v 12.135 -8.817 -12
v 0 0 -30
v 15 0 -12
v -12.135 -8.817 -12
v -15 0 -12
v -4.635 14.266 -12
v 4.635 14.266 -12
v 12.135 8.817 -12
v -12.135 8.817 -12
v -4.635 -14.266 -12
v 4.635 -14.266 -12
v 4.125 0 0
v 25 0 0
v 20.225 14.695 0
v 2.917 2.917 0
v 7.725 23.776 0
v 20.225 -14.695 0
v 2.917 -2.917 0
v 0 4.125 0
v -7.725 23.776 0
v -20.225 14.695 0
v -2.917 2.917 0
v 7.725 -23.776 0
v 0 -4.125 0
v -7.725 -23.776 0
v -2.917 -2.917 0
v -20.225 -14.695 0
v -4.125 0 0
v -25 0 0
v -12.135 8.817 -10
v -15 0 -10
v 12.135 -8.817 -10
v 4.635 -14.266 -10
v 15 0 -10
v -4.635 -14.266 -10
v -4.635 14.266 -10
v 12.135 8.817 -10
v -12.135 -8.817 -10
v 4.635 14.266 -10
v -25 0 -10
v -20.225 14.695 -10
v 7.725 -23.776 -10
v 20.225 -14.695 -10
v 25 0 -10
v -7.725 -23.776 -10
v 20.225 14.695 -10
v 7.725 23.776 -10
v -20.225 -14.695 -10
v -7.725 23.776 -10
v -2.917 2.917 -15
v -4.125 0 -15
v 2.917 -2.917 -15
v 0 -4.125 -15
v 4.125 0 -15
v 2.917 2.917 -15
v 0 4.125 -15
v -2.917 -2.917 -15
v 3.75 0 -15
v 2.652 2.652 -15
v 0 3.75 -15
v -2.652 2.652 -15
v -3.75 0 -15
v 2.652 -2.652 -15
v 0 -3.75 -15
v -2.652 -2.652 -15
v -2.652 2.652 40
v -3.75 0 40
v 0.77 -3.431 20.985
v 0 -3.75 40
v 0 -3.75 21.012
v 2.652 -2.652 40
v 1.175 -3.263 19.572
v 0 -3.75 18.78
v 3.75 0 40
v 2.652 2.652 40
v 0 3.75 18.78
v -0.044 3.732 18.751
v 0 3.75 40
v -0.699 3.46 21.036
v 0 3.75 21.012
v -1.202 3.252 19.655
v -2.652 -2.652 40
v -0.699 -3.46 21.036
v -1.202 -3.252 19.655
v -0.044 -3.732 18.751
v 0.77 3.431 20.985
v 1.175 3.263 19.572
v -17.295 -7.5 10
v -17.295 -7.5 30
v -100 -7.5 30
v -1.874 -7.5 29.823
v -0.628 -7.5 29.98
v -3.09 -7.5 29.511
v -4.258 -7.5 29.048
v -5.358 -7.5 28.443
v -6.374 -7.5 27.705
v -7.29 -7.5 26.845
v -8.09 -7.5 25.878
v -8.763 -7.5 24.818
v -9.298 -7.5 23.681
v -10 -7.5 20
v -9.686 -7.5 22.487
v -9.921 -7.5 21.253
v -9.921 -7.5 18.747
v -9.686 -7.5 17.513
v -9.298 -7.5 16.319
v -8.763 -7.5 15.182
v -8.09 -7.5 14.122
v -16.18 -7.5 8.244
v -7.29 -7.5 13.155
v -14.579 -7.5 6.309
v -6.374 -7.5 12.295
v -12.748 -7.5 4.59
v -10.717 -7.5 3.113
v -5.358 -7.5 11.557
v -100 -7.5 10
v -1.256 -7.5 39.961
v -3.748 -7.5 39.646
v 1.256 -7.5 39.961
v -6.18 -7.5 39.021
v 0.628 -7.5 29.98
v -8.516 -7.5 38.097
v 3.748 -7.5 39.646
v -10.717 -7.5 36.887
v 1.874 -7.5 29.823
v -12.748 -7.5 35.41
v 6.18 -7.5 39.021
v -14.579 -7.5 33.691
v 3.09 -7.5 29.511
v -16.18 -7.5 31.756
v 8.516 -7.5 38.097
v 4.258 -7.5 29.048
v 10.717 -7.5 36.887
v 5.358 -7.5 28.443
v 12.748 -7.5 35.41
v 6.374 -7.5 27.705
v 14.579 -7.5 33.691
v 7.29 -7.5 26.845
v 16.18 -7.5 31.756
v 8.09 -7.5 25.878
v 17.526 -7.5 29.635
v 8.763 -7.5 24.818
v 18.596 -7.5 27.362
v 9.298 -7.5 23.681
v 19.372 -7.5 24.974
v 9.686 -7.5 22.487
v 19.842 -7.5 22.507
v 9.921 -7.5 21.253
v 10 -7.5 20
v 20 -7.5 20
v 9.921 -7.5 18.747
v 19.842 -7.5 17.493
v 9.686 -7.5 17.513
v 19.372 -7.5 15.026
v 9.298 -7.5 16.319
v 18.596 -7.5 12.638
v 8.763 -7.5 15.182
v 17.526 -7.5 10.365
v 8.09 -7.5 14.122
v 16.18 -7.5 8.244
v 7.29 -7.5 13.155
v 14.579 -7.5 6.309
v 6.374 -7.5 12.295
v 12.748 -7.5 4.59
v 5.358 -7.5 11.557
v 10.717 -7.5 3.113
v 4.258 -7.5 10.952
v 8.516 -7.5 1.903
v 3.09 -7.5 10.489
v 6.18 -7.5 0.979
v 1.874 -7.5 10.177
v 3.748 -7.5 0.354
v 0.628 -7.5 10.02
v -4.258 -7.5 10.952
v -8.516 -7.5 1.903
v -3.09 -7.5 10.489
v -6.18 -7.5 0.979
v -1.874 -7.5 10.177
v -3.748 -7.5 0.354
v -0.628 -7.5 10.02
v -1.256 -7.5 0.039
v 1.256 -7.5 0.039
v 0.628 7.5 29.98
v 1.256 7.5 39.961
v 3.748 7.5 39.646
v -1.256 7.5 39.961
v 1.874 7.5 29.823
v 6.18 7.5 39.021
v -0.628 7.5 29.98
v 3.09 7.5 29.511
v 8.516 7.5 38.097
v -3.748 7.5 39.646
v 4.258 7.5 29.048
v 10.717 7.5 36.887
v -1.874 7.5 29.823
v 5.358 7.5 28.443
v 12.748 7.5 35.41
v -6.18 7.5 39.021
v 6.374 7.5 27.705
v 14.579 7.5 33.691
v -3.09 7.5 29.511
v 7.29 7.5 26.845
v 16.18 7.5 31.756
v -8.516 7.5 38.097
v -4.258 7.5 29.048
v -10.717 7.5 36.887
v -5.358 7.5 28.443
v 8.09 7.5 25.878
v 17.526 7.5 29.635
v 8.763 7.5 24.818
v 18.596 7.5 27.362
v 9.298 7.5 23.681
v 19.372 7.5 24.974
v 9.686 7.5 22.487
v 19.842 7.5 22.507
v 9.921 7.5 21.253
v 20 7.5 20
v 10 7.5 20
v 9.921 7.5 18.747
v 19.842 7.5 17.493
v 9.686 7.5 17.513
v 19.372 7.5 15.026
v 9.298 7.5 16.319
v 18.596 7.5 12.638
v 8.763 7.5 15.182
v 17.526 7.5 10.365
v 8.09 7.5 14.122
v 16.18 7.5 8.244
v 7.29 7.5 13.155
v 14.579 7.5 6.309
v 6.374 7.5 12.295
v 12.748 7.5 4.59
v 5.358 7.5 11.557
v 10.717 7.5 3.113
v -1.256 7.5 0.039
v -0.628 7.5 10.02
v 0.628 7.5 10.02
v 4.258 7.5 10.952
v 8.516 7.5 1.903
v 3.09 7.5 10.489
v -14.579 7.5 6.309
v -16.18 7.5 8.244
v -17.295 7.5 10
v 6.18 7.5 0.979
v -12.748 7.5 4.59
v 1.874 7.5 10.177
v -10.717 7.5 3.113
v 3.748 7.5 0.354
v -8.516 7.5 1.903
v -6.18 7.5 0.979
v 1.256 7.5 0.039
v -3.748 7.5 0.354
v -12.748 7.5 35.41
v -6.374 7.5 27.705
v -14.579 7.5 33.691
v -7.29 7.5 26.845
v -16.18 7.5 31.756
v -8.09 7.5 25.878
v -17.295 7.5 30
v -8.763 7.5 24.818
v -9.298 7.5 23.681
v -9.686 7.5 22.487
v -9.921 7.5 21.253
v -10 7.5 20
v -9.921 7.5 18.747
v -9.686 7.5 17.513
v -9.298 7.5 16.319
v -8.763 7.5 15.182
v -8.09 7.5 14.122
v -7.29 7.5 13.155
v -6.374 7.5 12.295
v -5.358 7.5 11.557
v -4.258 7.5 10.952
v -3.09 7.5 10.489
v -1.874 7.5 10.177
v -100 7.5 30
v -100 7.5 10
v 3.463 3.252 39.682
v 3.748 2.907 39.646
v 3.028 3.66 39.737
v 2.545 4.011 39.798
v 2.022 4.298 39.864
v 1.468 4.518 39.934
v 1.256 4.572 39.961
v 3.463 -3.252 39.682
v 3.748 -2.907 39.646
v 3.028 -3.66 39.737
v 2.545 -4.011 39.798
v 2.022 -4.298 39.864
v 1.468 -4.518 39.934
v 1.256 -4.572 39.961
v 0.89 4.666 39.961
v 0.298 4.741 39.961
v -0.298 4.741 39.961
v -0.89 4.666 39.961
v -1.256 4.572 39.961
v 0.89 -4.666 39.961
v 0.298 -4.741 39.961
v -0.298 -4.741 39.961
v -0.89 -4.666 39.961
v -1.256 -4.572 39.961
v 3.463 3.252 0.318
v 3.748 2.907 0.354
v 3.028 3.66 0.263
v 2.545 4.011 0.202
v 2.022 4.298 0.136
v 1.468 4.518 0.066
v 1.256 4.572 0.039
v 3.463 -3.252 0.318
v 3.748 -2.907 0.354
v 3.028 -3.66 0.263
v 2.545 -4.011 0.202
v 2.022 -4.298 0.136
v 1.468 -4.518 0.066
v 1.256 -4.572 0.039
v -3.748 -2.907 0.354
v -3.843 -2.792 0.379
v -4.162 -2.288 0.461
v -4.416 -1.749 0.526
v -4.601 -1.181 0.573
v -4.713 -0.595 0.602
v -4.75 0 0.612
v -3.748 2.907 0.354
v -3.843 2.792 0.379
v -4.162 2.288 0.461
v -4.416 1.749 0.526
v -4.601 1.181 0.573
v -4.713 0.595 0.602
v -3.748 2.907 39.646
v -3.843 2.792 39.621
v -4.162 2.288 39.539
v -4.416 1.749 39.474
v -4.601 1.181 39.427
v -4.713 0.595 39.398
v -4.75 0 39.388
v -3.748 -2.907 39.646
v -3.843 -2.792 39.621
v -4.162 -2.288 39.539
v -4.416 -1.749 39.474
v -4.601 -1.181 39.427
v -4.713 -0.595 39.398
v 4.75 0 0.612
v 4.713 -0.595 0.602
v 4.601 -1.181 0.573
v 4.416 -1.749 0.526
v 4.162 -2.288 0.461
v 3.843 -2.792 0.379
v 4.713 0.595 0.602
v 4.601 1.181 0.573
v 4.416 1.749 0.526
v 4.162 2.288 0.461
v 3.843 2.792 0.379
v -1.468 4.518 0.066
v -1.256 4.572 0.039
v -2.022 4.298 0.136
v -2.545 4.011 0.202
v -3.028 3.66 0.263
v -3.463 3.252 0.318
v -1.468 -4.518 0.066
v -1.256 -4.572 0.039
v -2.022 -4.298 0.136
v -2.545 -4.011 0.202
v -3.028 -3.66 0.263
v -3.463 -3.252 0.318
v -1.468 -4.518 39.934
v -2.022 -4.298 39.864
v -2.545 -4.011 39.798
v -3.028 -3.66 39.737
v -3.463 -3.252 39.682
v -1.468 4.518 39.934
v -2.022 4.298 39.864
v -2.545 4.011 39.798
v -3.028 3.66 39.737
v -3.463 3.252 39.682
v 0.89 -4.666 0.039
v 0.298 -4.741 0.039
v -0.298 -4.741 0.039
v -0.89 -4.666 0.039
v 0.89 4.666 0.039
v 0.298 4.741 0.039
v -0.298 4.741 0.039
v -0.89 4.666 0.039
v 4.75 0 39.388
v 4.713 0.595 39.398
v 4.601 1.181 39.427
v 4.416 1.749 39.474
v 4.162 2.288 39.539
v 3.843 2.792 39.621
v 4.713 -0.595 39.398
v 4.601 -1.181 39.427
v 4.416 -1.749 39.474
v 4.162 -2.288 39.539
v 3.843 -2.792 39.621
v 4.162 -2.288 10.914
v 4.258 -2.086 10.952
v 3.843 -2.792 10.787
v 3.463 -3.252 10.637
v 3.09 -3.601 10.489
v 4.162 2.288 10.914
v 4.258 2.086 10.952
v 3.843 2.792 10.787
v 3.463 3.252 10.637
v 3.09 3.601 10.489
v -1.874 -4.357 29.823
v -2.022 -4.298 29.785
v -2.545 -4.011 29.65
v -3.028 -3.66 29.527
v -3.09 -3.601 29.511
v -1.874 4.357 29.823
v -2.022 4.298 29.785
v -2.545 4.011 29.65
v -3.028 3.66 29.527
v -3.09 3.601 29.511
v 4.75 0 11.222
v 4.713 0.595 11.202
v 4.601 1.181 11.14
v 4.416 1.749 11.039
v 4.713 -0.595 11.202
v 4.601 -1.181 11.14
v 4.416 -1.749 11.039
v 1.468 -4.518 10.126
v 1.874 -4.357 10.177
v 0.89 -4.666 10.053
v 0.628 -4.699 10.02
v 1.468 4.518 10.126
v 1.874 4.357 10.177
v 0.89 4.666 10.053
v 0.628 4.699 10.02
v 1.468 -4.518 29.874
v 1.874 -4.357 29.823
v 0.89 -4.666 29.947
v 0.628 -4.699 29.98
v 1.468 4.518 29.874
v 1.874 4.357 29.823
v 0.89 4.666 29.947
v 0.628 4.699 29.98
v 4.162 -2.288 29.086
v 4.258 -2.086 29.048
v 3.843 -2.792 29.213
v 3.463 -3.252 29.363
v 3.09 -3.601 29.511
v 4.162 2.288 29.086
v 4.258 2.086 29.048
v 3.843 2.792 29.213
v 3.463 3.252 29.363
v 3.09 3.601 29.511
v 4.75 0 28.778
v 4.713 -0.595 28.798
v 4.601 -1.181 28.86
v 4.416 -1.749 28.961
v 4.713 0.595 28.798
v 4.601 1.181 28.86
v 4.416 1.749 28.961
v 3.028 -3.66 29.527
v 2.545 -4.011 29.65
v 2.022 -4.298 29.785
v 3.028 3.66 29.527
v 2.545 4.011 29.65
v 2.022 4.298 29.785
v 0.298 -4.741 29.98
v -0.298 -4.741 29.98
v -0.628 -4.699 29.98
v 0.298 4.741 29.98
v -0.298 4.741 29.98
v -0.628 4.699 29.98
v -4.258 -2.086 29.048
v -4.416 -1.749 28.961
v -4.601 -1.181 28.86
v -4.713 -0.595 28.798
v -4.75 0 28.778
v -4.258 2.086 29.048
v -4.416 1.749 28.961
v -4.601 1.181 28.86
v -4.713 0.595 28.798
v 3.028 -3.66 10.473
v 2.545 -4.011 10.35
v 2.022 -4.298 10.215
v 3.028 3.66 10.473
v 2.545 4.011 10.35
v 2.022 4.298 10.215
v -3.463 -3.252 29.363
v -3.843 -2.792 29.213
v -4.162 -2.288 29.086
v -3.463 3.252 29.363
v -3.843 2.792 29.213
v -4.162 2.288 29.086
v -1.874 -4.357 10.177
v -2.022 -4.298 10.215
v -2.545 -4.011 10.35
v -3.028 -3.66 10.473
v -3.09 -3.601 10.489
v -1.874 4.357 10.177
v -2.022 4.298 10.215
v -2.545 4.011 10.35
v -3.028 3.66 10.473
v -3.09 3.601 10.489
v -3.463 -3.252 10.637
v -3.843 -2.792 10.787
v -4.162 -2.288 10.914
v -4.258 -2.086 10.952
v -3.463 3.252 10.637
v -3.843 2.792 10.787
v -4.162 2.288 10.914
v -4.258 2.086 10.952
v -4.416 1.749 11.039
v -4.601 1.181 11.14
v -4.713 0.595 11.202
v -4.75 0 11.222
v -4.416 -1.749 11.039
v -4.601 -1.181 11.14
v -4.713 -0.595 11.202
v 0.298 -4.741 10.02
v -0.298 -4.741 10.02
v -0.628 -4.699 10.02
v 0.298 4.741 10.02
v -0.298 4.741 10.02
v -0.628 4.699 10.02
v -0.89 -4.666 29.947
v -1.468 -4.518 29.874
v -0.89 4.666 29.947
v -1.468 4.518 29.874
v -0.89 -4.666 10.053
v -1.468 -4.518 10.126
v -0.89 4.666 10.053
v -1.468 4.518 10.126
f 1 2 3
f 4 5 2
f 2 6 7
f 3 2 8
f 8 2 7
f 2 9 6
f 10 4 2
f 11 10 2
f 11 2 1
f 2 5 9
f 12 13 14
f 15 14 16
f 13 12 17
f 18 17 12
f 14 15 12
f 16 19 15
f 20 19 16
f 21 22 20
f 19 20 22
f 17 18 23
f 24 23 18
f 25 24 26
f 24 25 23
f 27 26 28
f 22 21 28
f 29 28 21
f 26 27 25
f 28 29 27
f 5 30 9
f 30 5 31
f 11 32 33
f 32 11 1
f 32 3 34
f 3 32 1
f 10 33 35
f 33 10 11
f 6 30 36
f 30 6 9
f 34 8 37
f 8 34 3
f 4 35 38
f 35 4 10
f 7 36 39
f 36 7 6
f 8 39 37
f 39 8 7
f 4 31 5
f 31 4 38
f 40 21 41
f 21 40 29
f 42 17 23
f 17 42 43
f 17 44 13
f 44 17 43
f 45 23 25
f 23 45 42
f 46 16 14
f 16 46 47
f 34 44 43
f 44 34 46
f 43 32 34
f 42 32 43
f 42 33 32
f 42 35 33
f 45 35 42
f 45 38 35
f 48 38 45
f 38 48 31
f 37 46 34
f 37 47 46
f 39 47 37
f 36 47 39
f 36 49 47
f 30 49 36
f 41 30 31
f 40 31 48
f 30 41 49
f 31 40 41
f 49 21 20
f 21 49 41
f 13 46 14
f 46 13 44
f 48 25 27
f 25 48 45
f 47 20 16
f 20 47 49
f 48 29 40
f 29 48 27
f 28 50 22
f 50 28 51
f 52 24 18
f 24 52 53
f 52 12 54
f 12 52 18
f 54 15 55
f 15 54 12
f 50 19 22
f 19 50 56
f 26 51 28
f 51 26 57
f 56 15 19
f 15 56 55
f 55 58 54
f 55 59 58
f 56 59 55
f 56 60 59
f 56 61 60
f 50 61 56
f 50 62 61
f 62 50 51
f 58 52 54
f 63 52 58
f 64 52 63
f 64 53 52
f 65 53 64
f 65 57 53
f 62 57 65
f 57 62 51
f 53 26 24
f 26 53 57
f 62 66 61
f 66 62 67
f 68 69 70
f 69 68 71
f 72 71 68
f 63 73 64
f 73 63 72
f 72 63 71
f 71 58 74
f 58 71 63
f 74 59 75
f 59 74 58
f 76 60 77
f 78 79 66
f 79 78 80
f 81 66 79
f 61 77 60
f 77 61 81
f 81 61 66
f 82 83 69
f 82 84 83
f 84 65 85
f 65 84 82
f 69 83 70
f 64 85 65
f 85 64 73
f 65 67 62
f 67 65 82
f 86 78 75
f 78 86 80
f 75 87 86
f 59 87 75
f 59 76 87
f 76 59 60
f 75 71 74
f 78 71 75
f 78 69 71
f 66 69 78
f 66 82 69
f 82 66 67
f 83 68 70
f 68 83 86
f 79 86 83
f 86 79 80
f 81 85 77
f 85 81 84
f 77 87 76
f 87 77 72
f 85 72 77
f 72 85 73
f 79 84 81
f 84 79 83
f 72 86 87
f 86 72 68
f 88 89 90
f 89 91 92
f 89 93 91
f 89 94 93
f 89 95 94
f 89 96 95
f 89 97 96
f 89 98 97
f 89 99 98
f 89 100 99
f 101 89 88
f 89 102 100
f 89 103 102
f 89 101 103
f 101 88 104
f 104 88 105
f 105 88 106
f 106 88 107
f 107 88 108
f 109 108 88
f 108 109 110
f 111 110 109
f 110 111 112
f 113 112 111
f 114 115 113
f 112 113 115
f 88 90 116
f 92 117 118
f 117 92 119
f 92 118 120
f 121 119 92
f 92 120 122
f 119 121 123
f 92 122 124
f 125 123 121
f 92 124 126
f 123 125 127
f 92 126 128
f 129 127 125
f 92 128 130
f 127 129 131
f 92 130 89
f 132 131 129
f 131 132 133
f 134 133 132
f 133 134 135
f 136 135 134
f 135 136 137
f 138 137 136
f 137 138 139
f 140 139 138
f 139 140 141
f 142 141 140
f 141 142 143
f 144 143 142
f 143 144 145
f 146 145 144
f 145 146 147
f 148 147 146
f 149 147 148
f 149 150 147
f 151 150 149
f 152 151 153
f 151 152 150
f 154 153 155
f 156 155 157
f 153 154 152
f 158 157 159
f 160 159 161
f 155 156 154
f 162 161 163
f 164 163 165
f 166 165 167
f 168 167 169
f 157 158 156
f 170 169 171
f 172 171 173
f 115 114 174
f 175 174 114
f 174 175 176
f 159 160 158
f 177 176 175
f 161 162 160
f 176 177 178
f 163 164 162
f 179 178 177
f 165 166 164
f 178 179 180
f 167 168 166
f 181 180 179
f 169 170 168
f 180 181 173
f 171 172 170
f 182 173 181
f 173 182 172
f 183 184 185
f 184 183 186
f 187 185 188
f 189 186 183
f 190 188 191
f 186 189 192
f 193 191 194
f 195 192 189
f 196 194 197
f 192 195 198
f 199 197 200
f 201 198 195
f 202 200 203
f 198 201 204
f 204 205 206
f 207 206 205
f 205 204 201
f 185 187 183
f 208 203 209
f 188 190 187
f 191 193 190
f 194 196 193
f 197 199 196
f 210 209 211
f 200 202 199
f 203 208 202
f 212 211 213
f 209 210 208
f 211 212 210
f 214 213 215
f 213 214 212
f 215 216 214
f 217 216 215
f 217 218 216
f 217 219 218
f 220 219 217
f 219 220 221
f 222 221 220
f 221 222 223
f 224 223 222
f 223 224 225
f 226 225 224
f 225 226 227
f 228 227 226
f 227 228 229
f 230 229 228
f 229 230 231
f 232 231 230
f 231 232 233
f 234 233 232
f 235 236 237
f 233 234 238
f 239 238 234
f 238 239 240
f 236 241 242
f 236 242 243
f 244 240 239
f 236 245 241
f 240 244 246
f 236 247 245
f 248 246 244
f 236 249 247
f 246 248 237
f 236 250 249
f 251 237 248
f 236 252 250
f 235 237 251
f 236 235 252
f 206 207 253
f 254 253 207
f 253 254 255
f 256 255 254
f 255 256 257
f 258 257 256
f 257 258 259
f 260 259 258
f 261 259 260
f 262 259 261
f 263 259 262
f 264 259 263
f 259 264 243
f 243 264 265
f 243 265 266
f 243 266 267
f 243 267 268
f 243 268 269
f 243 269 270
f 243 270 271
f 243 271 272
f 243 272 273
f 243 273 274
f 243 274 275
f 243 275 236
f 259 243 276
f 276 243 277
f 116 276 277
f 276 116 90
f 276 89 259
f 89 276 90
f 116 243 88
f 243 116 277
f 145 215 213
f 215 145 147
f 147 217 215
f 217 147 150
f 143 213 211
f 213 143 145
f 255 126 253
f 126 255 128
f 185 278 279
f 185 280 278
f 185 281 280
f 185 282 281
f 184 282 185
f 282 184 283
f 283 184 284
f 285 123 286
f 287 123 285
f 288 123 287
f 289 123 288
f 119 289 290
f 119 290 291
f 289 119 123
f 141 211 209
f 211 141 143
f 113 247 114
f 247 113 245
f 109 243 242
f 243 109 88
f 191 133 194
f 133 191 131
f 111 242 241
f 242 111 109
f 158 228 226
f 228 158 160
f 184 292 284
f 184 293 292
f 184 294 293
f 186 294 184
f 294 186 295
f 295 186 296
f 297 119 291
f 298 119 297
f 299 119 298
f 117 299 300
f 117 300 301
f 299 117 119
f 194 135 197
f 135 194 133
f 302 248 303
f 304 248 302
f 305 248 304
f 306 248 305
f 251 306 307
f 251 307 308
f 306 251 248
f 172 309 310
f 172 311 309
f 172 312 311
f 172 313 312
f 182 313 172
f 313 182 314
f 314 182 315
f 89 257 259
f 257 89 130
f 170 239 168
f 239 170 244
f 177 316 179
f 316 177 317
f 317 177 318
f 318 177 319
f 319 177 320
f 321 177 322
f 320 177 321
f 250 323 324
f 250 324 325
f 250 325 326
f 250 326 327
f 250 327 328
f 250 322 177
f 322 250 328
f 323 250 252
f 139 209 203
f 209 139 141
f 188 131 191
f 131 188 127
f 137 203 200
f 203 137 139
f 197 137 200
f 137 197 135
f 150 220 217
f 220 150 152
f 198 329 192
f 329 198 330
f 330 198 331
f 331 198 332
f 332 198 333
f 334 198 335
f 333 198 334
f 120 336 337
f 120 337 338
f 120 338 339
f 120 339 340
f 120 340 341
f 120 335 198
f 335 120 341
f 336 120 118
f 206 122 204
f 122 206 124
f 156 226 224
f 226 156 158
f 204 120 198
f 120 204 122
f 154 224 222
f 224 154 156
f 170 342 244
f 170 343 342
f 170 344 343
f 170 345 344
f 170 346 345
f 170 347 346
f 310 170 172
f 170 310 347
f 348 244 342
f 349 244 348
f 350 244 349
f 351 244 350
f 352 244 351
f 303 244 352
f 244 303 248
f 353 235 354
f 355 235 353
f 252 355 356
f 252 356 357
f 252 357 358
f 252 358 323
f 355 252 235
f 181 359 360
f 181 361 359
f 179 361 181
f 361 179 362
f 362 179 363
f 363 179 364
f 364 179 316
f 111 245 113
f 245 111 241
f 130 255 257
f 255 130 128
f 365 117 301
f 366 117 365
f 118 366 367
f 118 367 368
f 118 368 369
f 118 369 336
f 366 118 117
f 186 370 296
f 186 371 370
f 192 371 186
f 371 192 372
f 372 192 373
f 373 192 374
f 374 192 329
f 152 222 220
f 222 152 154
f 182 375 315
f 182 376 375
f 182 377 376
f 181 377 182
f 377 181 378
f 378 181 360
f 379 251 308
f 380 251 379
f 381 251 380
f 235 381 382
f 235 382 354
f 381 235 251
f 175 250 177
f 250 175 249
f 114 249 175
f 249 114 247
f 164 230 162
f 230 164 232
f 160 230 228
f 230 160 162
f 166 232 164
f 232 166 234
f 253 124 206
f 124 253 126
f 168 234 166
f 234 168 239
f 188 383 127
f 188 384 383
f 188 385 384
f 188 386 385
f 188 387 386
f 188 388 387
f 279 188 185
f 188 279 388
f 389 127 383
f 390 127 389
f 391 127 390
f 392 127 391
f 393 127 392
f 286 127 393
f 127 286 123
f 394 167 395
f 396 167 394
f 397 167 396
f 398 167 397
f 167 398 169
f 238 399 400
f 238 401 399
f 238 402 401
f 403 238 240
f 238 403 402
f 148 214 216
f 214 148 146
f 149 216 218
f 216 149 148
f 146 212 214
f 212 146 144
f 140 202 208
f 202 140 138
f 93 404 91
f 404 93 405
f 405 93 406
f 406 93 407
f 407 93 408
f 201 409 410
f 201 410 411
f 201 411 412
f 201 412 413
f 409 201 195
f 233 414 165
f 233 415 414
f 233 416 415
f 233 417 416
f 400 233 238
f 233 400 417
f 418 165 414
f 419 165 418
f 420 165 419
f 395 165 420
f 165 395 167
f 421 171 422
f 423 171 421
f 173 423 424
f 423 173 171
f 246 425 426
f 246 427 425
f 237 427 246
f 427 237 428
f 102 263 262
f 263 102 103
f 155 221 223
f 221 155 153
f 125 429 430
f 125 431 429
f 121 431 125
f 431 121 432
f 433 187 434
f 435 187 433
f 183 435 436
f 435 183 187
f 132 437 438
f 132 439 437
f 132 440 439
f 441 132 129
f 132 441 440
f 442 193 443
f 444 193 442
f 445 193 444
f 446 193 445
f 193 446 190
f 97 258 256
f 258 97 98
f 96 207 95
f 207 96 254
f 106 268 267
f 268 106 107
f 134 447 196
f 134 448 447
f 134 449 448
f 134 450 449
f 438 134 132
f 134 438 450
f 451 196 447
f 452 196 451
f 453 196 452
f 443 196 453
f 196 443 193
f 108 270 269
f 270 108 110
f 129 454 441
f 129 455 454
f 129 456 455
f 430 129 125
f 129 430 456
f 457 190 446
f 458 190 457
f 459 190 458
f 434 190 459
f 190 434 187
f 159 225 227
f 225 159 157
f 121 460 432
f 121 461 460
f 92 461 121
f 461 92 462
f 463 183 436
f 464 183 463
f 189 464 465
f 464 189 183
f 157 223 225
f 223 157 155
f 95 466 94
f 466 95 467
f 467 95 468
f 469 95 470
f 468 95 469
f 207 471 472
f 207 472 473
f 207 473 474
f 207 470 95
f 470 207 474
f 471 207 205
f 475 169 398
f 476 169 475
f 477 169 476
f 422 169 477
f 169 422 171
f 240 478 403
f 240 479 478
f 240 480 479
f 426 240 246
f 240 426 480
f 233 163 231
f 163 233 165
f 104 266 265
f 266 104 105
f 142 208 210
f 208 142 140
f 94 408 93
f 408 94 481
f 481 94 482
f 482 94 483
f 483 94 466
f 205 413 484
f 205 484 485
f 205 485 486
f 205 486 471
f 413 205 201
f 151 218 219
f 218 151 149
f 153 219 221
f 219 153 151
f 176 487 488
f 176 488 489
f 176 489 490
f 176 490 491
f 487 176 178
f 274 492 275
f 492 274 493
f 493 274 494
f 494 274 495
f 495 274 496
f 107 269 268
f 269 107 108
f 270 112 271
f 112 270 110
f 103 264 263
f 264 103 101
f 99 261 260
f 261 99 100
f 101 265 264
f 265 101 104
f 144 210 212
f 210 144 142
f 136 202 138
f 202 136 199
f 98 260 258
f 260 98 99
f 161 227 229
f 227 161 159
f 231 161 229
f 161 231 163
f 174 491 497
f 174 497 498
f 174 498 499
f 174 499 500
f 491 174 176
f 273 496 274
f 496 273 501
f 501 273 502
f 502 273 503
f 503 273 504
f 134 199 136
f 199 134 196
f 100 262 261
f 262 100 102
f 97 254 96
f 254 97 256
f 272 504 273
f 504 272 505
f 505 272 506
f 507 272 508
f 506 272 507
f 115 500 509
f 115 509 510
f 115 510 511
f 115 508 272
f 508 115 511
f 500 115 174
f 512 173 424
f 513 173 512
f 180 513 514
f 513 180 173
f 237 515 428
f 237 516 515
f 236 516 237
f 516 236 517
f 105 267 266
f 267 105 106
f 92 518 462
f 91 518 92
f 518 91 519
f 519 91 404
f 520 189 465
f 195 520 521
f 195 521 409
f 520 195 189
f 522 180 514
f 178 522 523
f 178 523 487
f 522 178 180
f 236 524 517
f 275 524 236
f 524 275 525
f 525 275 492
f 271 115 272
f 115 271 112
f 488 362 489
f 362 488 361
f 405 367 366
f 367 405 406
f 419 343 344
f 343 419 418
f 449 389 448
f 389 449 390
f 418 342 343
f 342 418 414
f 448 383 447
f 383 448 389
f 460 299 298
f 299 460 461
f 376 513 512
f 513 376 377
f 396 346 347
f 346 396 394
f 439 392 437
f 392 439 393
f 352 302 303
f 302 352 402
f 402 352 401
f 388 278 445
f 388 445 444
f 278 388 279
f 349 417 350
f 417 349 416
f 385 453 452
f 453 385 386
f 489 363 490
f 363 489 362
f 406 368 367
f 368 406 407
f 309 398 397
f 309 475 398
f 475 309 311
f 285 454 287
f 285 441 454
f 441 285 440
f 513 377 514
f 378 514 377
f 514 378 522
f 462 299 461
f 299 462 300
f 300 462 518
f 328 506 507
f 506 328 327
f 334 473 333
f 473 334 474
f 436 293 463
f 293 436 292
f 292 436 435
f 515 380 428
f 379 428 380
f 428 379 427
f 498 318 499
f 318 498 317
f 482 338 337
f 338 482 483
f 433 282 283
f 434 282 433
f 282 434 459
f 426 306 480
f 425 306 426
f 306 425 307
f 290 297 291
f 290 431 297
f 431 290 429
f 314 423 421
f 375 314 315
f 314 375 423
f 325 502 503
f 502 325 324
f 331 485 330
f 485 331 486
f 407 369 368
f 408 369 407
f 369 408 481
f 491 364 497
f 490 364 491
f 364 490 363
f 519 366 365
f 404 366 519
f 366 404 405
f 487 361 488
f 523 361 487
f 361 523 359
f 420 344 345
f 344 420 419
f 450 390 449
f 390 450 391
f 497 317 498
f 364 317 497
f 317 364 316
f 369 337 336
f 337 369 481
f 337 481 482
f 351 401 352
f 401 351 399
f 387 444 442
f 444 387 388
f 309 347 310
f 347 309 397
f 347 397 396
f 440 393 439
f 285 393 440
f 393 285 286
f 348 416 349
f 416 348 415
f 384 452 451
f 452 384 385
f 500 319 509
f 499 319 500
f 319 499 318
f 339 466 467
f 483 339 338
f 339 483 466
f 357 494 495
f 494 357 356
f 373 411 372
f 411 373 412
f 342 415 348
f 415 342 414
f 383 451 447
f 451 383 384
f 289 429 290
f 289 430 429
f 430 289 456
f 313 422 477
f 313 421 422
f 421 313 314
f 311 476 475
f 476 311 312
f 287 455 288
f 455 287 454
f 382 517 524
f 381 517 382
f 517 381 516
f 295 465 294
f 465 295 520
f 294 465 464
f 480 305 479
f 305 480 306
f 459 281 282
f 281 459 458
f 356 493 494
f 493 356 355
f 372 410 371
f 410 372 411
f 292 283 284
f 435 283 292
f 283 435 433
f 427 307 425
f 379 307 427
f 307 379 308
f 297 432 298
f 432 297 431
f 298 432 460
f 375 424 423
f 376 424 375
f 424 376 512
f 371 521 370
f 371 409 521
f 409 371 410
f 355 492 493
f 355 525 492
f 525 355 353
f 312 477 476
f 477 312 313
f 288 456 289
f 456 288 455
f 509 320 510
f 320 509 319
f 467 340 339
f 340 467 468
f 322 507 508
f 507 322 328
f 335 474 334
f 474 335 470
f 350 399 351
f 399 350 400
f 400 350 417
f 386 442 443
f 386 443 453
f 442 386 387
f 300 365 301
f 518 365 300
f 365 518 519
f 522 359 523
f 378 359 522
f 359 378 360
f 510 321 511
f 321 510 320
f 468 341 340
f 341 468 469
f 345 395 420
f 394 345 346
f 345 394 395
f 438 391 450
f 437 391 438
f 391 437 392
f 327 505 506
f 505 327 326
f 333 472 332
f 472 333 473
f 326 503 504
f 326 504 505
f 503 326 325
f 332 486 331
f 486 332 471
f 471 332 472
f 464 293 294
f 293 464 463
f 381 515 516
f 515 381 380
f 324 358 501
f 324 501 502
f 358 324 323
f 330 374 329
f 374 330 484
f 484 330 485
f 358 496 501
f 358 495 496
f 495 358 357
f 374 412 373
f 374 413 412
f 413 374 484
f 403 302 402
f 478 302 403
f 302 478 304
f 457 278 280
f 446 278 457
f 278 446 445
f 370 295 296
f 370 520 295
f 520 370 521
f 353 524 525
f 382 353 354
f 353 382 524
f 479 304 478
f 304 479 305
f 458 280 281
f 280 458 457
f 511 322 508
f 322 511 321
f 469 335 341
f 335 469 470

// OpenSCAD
/*[top dimensions]*/
//Show assembled
assembled=1; //[1:yes, 0:no]
stem_height=40;
stem_dia=7.5;
stem_dia_tol=.75;
stem_facets=8;
stem_hole_dia=2.5;
stem_hole_offset=stem_height/2;

base_height=30;
base_dia=50;
base_facets=10;
base_chamfer=10;
base_ring_dia=50;
base_ring_height=10;

/*[handle dimensions]*/
handle_length=100;
handle_thick=stem_dia*2;
handle_width=20;
hole_edge=10;
shaft_tol=1;


top();
if(assembled==0)
translate([0,handle_width+base_dia/2+base_ring_dia/2,0])
handle();
if(assembled==1)
translate([-handle_length/2,0,stem_height/2])
	rotate([90,0,0])
		handle();


module top(){
	if (assembled==1){
		union(){
			rotate([180,0,0])
				base();
			translate([0,0,stem_height])
				rotate([180,0,0])
					stem();
		}
	}
	if(assembled==0){
		base();
		translate([base_ring_dia/2+base_dia/2+stem_dia,0,0])
			stem();

	}

}

module handle(){
	difference(){
		union(){
			cube([handle_length,handle_width,handle_thick],center=true);
			translate([handle_length/2,0,0])
				cylinder(r=stem_height/2,h=handle_thick,$fn=50,center=true);
		}
		translate([handle_length/2,0,0])
			cylinder(r=stem_height/2-hole_edge,h=handle_thick*1.1,$fn=50,center=true);
		translate([handle_length/2,0,0])
			rotate([90,0,0])
				cylinder(r=stem_dia/2+shaft_tol,h=stem_height*1.1,center=true,$fn=50);
		//for(i=[-handle_length/2
	}
}

module base(){
	difference(){
		union(){
			intersection(){
				cylinder(r1=base_dia/2,r2=0,h=base_height,$fn=base_facets);
				cylinder(r=base_dia/2-base_chamfer,h=base_height,$fn=base_facets);
			}
			cylinder(r=base_ring_dia/2,h=base_ring_height,$fn=base_facets);
		}
		cylinder(r=stem_dia/2+stem_dia_tol/2,h=base_height/2,$fn=stem_facets);
	}
	
}

module stem(){
	difference(){
		cylinder(r=stem_dia/2,h=stem_height+base_height/2,$fn=stem_facets);
		translate([0,0,stem_hole_offset])
			rotate([90,-20,0])
				cylinder(r=stem_hole_dia/2,h=stem_dia*1.5,$fn=5,center=true);
	}


}
